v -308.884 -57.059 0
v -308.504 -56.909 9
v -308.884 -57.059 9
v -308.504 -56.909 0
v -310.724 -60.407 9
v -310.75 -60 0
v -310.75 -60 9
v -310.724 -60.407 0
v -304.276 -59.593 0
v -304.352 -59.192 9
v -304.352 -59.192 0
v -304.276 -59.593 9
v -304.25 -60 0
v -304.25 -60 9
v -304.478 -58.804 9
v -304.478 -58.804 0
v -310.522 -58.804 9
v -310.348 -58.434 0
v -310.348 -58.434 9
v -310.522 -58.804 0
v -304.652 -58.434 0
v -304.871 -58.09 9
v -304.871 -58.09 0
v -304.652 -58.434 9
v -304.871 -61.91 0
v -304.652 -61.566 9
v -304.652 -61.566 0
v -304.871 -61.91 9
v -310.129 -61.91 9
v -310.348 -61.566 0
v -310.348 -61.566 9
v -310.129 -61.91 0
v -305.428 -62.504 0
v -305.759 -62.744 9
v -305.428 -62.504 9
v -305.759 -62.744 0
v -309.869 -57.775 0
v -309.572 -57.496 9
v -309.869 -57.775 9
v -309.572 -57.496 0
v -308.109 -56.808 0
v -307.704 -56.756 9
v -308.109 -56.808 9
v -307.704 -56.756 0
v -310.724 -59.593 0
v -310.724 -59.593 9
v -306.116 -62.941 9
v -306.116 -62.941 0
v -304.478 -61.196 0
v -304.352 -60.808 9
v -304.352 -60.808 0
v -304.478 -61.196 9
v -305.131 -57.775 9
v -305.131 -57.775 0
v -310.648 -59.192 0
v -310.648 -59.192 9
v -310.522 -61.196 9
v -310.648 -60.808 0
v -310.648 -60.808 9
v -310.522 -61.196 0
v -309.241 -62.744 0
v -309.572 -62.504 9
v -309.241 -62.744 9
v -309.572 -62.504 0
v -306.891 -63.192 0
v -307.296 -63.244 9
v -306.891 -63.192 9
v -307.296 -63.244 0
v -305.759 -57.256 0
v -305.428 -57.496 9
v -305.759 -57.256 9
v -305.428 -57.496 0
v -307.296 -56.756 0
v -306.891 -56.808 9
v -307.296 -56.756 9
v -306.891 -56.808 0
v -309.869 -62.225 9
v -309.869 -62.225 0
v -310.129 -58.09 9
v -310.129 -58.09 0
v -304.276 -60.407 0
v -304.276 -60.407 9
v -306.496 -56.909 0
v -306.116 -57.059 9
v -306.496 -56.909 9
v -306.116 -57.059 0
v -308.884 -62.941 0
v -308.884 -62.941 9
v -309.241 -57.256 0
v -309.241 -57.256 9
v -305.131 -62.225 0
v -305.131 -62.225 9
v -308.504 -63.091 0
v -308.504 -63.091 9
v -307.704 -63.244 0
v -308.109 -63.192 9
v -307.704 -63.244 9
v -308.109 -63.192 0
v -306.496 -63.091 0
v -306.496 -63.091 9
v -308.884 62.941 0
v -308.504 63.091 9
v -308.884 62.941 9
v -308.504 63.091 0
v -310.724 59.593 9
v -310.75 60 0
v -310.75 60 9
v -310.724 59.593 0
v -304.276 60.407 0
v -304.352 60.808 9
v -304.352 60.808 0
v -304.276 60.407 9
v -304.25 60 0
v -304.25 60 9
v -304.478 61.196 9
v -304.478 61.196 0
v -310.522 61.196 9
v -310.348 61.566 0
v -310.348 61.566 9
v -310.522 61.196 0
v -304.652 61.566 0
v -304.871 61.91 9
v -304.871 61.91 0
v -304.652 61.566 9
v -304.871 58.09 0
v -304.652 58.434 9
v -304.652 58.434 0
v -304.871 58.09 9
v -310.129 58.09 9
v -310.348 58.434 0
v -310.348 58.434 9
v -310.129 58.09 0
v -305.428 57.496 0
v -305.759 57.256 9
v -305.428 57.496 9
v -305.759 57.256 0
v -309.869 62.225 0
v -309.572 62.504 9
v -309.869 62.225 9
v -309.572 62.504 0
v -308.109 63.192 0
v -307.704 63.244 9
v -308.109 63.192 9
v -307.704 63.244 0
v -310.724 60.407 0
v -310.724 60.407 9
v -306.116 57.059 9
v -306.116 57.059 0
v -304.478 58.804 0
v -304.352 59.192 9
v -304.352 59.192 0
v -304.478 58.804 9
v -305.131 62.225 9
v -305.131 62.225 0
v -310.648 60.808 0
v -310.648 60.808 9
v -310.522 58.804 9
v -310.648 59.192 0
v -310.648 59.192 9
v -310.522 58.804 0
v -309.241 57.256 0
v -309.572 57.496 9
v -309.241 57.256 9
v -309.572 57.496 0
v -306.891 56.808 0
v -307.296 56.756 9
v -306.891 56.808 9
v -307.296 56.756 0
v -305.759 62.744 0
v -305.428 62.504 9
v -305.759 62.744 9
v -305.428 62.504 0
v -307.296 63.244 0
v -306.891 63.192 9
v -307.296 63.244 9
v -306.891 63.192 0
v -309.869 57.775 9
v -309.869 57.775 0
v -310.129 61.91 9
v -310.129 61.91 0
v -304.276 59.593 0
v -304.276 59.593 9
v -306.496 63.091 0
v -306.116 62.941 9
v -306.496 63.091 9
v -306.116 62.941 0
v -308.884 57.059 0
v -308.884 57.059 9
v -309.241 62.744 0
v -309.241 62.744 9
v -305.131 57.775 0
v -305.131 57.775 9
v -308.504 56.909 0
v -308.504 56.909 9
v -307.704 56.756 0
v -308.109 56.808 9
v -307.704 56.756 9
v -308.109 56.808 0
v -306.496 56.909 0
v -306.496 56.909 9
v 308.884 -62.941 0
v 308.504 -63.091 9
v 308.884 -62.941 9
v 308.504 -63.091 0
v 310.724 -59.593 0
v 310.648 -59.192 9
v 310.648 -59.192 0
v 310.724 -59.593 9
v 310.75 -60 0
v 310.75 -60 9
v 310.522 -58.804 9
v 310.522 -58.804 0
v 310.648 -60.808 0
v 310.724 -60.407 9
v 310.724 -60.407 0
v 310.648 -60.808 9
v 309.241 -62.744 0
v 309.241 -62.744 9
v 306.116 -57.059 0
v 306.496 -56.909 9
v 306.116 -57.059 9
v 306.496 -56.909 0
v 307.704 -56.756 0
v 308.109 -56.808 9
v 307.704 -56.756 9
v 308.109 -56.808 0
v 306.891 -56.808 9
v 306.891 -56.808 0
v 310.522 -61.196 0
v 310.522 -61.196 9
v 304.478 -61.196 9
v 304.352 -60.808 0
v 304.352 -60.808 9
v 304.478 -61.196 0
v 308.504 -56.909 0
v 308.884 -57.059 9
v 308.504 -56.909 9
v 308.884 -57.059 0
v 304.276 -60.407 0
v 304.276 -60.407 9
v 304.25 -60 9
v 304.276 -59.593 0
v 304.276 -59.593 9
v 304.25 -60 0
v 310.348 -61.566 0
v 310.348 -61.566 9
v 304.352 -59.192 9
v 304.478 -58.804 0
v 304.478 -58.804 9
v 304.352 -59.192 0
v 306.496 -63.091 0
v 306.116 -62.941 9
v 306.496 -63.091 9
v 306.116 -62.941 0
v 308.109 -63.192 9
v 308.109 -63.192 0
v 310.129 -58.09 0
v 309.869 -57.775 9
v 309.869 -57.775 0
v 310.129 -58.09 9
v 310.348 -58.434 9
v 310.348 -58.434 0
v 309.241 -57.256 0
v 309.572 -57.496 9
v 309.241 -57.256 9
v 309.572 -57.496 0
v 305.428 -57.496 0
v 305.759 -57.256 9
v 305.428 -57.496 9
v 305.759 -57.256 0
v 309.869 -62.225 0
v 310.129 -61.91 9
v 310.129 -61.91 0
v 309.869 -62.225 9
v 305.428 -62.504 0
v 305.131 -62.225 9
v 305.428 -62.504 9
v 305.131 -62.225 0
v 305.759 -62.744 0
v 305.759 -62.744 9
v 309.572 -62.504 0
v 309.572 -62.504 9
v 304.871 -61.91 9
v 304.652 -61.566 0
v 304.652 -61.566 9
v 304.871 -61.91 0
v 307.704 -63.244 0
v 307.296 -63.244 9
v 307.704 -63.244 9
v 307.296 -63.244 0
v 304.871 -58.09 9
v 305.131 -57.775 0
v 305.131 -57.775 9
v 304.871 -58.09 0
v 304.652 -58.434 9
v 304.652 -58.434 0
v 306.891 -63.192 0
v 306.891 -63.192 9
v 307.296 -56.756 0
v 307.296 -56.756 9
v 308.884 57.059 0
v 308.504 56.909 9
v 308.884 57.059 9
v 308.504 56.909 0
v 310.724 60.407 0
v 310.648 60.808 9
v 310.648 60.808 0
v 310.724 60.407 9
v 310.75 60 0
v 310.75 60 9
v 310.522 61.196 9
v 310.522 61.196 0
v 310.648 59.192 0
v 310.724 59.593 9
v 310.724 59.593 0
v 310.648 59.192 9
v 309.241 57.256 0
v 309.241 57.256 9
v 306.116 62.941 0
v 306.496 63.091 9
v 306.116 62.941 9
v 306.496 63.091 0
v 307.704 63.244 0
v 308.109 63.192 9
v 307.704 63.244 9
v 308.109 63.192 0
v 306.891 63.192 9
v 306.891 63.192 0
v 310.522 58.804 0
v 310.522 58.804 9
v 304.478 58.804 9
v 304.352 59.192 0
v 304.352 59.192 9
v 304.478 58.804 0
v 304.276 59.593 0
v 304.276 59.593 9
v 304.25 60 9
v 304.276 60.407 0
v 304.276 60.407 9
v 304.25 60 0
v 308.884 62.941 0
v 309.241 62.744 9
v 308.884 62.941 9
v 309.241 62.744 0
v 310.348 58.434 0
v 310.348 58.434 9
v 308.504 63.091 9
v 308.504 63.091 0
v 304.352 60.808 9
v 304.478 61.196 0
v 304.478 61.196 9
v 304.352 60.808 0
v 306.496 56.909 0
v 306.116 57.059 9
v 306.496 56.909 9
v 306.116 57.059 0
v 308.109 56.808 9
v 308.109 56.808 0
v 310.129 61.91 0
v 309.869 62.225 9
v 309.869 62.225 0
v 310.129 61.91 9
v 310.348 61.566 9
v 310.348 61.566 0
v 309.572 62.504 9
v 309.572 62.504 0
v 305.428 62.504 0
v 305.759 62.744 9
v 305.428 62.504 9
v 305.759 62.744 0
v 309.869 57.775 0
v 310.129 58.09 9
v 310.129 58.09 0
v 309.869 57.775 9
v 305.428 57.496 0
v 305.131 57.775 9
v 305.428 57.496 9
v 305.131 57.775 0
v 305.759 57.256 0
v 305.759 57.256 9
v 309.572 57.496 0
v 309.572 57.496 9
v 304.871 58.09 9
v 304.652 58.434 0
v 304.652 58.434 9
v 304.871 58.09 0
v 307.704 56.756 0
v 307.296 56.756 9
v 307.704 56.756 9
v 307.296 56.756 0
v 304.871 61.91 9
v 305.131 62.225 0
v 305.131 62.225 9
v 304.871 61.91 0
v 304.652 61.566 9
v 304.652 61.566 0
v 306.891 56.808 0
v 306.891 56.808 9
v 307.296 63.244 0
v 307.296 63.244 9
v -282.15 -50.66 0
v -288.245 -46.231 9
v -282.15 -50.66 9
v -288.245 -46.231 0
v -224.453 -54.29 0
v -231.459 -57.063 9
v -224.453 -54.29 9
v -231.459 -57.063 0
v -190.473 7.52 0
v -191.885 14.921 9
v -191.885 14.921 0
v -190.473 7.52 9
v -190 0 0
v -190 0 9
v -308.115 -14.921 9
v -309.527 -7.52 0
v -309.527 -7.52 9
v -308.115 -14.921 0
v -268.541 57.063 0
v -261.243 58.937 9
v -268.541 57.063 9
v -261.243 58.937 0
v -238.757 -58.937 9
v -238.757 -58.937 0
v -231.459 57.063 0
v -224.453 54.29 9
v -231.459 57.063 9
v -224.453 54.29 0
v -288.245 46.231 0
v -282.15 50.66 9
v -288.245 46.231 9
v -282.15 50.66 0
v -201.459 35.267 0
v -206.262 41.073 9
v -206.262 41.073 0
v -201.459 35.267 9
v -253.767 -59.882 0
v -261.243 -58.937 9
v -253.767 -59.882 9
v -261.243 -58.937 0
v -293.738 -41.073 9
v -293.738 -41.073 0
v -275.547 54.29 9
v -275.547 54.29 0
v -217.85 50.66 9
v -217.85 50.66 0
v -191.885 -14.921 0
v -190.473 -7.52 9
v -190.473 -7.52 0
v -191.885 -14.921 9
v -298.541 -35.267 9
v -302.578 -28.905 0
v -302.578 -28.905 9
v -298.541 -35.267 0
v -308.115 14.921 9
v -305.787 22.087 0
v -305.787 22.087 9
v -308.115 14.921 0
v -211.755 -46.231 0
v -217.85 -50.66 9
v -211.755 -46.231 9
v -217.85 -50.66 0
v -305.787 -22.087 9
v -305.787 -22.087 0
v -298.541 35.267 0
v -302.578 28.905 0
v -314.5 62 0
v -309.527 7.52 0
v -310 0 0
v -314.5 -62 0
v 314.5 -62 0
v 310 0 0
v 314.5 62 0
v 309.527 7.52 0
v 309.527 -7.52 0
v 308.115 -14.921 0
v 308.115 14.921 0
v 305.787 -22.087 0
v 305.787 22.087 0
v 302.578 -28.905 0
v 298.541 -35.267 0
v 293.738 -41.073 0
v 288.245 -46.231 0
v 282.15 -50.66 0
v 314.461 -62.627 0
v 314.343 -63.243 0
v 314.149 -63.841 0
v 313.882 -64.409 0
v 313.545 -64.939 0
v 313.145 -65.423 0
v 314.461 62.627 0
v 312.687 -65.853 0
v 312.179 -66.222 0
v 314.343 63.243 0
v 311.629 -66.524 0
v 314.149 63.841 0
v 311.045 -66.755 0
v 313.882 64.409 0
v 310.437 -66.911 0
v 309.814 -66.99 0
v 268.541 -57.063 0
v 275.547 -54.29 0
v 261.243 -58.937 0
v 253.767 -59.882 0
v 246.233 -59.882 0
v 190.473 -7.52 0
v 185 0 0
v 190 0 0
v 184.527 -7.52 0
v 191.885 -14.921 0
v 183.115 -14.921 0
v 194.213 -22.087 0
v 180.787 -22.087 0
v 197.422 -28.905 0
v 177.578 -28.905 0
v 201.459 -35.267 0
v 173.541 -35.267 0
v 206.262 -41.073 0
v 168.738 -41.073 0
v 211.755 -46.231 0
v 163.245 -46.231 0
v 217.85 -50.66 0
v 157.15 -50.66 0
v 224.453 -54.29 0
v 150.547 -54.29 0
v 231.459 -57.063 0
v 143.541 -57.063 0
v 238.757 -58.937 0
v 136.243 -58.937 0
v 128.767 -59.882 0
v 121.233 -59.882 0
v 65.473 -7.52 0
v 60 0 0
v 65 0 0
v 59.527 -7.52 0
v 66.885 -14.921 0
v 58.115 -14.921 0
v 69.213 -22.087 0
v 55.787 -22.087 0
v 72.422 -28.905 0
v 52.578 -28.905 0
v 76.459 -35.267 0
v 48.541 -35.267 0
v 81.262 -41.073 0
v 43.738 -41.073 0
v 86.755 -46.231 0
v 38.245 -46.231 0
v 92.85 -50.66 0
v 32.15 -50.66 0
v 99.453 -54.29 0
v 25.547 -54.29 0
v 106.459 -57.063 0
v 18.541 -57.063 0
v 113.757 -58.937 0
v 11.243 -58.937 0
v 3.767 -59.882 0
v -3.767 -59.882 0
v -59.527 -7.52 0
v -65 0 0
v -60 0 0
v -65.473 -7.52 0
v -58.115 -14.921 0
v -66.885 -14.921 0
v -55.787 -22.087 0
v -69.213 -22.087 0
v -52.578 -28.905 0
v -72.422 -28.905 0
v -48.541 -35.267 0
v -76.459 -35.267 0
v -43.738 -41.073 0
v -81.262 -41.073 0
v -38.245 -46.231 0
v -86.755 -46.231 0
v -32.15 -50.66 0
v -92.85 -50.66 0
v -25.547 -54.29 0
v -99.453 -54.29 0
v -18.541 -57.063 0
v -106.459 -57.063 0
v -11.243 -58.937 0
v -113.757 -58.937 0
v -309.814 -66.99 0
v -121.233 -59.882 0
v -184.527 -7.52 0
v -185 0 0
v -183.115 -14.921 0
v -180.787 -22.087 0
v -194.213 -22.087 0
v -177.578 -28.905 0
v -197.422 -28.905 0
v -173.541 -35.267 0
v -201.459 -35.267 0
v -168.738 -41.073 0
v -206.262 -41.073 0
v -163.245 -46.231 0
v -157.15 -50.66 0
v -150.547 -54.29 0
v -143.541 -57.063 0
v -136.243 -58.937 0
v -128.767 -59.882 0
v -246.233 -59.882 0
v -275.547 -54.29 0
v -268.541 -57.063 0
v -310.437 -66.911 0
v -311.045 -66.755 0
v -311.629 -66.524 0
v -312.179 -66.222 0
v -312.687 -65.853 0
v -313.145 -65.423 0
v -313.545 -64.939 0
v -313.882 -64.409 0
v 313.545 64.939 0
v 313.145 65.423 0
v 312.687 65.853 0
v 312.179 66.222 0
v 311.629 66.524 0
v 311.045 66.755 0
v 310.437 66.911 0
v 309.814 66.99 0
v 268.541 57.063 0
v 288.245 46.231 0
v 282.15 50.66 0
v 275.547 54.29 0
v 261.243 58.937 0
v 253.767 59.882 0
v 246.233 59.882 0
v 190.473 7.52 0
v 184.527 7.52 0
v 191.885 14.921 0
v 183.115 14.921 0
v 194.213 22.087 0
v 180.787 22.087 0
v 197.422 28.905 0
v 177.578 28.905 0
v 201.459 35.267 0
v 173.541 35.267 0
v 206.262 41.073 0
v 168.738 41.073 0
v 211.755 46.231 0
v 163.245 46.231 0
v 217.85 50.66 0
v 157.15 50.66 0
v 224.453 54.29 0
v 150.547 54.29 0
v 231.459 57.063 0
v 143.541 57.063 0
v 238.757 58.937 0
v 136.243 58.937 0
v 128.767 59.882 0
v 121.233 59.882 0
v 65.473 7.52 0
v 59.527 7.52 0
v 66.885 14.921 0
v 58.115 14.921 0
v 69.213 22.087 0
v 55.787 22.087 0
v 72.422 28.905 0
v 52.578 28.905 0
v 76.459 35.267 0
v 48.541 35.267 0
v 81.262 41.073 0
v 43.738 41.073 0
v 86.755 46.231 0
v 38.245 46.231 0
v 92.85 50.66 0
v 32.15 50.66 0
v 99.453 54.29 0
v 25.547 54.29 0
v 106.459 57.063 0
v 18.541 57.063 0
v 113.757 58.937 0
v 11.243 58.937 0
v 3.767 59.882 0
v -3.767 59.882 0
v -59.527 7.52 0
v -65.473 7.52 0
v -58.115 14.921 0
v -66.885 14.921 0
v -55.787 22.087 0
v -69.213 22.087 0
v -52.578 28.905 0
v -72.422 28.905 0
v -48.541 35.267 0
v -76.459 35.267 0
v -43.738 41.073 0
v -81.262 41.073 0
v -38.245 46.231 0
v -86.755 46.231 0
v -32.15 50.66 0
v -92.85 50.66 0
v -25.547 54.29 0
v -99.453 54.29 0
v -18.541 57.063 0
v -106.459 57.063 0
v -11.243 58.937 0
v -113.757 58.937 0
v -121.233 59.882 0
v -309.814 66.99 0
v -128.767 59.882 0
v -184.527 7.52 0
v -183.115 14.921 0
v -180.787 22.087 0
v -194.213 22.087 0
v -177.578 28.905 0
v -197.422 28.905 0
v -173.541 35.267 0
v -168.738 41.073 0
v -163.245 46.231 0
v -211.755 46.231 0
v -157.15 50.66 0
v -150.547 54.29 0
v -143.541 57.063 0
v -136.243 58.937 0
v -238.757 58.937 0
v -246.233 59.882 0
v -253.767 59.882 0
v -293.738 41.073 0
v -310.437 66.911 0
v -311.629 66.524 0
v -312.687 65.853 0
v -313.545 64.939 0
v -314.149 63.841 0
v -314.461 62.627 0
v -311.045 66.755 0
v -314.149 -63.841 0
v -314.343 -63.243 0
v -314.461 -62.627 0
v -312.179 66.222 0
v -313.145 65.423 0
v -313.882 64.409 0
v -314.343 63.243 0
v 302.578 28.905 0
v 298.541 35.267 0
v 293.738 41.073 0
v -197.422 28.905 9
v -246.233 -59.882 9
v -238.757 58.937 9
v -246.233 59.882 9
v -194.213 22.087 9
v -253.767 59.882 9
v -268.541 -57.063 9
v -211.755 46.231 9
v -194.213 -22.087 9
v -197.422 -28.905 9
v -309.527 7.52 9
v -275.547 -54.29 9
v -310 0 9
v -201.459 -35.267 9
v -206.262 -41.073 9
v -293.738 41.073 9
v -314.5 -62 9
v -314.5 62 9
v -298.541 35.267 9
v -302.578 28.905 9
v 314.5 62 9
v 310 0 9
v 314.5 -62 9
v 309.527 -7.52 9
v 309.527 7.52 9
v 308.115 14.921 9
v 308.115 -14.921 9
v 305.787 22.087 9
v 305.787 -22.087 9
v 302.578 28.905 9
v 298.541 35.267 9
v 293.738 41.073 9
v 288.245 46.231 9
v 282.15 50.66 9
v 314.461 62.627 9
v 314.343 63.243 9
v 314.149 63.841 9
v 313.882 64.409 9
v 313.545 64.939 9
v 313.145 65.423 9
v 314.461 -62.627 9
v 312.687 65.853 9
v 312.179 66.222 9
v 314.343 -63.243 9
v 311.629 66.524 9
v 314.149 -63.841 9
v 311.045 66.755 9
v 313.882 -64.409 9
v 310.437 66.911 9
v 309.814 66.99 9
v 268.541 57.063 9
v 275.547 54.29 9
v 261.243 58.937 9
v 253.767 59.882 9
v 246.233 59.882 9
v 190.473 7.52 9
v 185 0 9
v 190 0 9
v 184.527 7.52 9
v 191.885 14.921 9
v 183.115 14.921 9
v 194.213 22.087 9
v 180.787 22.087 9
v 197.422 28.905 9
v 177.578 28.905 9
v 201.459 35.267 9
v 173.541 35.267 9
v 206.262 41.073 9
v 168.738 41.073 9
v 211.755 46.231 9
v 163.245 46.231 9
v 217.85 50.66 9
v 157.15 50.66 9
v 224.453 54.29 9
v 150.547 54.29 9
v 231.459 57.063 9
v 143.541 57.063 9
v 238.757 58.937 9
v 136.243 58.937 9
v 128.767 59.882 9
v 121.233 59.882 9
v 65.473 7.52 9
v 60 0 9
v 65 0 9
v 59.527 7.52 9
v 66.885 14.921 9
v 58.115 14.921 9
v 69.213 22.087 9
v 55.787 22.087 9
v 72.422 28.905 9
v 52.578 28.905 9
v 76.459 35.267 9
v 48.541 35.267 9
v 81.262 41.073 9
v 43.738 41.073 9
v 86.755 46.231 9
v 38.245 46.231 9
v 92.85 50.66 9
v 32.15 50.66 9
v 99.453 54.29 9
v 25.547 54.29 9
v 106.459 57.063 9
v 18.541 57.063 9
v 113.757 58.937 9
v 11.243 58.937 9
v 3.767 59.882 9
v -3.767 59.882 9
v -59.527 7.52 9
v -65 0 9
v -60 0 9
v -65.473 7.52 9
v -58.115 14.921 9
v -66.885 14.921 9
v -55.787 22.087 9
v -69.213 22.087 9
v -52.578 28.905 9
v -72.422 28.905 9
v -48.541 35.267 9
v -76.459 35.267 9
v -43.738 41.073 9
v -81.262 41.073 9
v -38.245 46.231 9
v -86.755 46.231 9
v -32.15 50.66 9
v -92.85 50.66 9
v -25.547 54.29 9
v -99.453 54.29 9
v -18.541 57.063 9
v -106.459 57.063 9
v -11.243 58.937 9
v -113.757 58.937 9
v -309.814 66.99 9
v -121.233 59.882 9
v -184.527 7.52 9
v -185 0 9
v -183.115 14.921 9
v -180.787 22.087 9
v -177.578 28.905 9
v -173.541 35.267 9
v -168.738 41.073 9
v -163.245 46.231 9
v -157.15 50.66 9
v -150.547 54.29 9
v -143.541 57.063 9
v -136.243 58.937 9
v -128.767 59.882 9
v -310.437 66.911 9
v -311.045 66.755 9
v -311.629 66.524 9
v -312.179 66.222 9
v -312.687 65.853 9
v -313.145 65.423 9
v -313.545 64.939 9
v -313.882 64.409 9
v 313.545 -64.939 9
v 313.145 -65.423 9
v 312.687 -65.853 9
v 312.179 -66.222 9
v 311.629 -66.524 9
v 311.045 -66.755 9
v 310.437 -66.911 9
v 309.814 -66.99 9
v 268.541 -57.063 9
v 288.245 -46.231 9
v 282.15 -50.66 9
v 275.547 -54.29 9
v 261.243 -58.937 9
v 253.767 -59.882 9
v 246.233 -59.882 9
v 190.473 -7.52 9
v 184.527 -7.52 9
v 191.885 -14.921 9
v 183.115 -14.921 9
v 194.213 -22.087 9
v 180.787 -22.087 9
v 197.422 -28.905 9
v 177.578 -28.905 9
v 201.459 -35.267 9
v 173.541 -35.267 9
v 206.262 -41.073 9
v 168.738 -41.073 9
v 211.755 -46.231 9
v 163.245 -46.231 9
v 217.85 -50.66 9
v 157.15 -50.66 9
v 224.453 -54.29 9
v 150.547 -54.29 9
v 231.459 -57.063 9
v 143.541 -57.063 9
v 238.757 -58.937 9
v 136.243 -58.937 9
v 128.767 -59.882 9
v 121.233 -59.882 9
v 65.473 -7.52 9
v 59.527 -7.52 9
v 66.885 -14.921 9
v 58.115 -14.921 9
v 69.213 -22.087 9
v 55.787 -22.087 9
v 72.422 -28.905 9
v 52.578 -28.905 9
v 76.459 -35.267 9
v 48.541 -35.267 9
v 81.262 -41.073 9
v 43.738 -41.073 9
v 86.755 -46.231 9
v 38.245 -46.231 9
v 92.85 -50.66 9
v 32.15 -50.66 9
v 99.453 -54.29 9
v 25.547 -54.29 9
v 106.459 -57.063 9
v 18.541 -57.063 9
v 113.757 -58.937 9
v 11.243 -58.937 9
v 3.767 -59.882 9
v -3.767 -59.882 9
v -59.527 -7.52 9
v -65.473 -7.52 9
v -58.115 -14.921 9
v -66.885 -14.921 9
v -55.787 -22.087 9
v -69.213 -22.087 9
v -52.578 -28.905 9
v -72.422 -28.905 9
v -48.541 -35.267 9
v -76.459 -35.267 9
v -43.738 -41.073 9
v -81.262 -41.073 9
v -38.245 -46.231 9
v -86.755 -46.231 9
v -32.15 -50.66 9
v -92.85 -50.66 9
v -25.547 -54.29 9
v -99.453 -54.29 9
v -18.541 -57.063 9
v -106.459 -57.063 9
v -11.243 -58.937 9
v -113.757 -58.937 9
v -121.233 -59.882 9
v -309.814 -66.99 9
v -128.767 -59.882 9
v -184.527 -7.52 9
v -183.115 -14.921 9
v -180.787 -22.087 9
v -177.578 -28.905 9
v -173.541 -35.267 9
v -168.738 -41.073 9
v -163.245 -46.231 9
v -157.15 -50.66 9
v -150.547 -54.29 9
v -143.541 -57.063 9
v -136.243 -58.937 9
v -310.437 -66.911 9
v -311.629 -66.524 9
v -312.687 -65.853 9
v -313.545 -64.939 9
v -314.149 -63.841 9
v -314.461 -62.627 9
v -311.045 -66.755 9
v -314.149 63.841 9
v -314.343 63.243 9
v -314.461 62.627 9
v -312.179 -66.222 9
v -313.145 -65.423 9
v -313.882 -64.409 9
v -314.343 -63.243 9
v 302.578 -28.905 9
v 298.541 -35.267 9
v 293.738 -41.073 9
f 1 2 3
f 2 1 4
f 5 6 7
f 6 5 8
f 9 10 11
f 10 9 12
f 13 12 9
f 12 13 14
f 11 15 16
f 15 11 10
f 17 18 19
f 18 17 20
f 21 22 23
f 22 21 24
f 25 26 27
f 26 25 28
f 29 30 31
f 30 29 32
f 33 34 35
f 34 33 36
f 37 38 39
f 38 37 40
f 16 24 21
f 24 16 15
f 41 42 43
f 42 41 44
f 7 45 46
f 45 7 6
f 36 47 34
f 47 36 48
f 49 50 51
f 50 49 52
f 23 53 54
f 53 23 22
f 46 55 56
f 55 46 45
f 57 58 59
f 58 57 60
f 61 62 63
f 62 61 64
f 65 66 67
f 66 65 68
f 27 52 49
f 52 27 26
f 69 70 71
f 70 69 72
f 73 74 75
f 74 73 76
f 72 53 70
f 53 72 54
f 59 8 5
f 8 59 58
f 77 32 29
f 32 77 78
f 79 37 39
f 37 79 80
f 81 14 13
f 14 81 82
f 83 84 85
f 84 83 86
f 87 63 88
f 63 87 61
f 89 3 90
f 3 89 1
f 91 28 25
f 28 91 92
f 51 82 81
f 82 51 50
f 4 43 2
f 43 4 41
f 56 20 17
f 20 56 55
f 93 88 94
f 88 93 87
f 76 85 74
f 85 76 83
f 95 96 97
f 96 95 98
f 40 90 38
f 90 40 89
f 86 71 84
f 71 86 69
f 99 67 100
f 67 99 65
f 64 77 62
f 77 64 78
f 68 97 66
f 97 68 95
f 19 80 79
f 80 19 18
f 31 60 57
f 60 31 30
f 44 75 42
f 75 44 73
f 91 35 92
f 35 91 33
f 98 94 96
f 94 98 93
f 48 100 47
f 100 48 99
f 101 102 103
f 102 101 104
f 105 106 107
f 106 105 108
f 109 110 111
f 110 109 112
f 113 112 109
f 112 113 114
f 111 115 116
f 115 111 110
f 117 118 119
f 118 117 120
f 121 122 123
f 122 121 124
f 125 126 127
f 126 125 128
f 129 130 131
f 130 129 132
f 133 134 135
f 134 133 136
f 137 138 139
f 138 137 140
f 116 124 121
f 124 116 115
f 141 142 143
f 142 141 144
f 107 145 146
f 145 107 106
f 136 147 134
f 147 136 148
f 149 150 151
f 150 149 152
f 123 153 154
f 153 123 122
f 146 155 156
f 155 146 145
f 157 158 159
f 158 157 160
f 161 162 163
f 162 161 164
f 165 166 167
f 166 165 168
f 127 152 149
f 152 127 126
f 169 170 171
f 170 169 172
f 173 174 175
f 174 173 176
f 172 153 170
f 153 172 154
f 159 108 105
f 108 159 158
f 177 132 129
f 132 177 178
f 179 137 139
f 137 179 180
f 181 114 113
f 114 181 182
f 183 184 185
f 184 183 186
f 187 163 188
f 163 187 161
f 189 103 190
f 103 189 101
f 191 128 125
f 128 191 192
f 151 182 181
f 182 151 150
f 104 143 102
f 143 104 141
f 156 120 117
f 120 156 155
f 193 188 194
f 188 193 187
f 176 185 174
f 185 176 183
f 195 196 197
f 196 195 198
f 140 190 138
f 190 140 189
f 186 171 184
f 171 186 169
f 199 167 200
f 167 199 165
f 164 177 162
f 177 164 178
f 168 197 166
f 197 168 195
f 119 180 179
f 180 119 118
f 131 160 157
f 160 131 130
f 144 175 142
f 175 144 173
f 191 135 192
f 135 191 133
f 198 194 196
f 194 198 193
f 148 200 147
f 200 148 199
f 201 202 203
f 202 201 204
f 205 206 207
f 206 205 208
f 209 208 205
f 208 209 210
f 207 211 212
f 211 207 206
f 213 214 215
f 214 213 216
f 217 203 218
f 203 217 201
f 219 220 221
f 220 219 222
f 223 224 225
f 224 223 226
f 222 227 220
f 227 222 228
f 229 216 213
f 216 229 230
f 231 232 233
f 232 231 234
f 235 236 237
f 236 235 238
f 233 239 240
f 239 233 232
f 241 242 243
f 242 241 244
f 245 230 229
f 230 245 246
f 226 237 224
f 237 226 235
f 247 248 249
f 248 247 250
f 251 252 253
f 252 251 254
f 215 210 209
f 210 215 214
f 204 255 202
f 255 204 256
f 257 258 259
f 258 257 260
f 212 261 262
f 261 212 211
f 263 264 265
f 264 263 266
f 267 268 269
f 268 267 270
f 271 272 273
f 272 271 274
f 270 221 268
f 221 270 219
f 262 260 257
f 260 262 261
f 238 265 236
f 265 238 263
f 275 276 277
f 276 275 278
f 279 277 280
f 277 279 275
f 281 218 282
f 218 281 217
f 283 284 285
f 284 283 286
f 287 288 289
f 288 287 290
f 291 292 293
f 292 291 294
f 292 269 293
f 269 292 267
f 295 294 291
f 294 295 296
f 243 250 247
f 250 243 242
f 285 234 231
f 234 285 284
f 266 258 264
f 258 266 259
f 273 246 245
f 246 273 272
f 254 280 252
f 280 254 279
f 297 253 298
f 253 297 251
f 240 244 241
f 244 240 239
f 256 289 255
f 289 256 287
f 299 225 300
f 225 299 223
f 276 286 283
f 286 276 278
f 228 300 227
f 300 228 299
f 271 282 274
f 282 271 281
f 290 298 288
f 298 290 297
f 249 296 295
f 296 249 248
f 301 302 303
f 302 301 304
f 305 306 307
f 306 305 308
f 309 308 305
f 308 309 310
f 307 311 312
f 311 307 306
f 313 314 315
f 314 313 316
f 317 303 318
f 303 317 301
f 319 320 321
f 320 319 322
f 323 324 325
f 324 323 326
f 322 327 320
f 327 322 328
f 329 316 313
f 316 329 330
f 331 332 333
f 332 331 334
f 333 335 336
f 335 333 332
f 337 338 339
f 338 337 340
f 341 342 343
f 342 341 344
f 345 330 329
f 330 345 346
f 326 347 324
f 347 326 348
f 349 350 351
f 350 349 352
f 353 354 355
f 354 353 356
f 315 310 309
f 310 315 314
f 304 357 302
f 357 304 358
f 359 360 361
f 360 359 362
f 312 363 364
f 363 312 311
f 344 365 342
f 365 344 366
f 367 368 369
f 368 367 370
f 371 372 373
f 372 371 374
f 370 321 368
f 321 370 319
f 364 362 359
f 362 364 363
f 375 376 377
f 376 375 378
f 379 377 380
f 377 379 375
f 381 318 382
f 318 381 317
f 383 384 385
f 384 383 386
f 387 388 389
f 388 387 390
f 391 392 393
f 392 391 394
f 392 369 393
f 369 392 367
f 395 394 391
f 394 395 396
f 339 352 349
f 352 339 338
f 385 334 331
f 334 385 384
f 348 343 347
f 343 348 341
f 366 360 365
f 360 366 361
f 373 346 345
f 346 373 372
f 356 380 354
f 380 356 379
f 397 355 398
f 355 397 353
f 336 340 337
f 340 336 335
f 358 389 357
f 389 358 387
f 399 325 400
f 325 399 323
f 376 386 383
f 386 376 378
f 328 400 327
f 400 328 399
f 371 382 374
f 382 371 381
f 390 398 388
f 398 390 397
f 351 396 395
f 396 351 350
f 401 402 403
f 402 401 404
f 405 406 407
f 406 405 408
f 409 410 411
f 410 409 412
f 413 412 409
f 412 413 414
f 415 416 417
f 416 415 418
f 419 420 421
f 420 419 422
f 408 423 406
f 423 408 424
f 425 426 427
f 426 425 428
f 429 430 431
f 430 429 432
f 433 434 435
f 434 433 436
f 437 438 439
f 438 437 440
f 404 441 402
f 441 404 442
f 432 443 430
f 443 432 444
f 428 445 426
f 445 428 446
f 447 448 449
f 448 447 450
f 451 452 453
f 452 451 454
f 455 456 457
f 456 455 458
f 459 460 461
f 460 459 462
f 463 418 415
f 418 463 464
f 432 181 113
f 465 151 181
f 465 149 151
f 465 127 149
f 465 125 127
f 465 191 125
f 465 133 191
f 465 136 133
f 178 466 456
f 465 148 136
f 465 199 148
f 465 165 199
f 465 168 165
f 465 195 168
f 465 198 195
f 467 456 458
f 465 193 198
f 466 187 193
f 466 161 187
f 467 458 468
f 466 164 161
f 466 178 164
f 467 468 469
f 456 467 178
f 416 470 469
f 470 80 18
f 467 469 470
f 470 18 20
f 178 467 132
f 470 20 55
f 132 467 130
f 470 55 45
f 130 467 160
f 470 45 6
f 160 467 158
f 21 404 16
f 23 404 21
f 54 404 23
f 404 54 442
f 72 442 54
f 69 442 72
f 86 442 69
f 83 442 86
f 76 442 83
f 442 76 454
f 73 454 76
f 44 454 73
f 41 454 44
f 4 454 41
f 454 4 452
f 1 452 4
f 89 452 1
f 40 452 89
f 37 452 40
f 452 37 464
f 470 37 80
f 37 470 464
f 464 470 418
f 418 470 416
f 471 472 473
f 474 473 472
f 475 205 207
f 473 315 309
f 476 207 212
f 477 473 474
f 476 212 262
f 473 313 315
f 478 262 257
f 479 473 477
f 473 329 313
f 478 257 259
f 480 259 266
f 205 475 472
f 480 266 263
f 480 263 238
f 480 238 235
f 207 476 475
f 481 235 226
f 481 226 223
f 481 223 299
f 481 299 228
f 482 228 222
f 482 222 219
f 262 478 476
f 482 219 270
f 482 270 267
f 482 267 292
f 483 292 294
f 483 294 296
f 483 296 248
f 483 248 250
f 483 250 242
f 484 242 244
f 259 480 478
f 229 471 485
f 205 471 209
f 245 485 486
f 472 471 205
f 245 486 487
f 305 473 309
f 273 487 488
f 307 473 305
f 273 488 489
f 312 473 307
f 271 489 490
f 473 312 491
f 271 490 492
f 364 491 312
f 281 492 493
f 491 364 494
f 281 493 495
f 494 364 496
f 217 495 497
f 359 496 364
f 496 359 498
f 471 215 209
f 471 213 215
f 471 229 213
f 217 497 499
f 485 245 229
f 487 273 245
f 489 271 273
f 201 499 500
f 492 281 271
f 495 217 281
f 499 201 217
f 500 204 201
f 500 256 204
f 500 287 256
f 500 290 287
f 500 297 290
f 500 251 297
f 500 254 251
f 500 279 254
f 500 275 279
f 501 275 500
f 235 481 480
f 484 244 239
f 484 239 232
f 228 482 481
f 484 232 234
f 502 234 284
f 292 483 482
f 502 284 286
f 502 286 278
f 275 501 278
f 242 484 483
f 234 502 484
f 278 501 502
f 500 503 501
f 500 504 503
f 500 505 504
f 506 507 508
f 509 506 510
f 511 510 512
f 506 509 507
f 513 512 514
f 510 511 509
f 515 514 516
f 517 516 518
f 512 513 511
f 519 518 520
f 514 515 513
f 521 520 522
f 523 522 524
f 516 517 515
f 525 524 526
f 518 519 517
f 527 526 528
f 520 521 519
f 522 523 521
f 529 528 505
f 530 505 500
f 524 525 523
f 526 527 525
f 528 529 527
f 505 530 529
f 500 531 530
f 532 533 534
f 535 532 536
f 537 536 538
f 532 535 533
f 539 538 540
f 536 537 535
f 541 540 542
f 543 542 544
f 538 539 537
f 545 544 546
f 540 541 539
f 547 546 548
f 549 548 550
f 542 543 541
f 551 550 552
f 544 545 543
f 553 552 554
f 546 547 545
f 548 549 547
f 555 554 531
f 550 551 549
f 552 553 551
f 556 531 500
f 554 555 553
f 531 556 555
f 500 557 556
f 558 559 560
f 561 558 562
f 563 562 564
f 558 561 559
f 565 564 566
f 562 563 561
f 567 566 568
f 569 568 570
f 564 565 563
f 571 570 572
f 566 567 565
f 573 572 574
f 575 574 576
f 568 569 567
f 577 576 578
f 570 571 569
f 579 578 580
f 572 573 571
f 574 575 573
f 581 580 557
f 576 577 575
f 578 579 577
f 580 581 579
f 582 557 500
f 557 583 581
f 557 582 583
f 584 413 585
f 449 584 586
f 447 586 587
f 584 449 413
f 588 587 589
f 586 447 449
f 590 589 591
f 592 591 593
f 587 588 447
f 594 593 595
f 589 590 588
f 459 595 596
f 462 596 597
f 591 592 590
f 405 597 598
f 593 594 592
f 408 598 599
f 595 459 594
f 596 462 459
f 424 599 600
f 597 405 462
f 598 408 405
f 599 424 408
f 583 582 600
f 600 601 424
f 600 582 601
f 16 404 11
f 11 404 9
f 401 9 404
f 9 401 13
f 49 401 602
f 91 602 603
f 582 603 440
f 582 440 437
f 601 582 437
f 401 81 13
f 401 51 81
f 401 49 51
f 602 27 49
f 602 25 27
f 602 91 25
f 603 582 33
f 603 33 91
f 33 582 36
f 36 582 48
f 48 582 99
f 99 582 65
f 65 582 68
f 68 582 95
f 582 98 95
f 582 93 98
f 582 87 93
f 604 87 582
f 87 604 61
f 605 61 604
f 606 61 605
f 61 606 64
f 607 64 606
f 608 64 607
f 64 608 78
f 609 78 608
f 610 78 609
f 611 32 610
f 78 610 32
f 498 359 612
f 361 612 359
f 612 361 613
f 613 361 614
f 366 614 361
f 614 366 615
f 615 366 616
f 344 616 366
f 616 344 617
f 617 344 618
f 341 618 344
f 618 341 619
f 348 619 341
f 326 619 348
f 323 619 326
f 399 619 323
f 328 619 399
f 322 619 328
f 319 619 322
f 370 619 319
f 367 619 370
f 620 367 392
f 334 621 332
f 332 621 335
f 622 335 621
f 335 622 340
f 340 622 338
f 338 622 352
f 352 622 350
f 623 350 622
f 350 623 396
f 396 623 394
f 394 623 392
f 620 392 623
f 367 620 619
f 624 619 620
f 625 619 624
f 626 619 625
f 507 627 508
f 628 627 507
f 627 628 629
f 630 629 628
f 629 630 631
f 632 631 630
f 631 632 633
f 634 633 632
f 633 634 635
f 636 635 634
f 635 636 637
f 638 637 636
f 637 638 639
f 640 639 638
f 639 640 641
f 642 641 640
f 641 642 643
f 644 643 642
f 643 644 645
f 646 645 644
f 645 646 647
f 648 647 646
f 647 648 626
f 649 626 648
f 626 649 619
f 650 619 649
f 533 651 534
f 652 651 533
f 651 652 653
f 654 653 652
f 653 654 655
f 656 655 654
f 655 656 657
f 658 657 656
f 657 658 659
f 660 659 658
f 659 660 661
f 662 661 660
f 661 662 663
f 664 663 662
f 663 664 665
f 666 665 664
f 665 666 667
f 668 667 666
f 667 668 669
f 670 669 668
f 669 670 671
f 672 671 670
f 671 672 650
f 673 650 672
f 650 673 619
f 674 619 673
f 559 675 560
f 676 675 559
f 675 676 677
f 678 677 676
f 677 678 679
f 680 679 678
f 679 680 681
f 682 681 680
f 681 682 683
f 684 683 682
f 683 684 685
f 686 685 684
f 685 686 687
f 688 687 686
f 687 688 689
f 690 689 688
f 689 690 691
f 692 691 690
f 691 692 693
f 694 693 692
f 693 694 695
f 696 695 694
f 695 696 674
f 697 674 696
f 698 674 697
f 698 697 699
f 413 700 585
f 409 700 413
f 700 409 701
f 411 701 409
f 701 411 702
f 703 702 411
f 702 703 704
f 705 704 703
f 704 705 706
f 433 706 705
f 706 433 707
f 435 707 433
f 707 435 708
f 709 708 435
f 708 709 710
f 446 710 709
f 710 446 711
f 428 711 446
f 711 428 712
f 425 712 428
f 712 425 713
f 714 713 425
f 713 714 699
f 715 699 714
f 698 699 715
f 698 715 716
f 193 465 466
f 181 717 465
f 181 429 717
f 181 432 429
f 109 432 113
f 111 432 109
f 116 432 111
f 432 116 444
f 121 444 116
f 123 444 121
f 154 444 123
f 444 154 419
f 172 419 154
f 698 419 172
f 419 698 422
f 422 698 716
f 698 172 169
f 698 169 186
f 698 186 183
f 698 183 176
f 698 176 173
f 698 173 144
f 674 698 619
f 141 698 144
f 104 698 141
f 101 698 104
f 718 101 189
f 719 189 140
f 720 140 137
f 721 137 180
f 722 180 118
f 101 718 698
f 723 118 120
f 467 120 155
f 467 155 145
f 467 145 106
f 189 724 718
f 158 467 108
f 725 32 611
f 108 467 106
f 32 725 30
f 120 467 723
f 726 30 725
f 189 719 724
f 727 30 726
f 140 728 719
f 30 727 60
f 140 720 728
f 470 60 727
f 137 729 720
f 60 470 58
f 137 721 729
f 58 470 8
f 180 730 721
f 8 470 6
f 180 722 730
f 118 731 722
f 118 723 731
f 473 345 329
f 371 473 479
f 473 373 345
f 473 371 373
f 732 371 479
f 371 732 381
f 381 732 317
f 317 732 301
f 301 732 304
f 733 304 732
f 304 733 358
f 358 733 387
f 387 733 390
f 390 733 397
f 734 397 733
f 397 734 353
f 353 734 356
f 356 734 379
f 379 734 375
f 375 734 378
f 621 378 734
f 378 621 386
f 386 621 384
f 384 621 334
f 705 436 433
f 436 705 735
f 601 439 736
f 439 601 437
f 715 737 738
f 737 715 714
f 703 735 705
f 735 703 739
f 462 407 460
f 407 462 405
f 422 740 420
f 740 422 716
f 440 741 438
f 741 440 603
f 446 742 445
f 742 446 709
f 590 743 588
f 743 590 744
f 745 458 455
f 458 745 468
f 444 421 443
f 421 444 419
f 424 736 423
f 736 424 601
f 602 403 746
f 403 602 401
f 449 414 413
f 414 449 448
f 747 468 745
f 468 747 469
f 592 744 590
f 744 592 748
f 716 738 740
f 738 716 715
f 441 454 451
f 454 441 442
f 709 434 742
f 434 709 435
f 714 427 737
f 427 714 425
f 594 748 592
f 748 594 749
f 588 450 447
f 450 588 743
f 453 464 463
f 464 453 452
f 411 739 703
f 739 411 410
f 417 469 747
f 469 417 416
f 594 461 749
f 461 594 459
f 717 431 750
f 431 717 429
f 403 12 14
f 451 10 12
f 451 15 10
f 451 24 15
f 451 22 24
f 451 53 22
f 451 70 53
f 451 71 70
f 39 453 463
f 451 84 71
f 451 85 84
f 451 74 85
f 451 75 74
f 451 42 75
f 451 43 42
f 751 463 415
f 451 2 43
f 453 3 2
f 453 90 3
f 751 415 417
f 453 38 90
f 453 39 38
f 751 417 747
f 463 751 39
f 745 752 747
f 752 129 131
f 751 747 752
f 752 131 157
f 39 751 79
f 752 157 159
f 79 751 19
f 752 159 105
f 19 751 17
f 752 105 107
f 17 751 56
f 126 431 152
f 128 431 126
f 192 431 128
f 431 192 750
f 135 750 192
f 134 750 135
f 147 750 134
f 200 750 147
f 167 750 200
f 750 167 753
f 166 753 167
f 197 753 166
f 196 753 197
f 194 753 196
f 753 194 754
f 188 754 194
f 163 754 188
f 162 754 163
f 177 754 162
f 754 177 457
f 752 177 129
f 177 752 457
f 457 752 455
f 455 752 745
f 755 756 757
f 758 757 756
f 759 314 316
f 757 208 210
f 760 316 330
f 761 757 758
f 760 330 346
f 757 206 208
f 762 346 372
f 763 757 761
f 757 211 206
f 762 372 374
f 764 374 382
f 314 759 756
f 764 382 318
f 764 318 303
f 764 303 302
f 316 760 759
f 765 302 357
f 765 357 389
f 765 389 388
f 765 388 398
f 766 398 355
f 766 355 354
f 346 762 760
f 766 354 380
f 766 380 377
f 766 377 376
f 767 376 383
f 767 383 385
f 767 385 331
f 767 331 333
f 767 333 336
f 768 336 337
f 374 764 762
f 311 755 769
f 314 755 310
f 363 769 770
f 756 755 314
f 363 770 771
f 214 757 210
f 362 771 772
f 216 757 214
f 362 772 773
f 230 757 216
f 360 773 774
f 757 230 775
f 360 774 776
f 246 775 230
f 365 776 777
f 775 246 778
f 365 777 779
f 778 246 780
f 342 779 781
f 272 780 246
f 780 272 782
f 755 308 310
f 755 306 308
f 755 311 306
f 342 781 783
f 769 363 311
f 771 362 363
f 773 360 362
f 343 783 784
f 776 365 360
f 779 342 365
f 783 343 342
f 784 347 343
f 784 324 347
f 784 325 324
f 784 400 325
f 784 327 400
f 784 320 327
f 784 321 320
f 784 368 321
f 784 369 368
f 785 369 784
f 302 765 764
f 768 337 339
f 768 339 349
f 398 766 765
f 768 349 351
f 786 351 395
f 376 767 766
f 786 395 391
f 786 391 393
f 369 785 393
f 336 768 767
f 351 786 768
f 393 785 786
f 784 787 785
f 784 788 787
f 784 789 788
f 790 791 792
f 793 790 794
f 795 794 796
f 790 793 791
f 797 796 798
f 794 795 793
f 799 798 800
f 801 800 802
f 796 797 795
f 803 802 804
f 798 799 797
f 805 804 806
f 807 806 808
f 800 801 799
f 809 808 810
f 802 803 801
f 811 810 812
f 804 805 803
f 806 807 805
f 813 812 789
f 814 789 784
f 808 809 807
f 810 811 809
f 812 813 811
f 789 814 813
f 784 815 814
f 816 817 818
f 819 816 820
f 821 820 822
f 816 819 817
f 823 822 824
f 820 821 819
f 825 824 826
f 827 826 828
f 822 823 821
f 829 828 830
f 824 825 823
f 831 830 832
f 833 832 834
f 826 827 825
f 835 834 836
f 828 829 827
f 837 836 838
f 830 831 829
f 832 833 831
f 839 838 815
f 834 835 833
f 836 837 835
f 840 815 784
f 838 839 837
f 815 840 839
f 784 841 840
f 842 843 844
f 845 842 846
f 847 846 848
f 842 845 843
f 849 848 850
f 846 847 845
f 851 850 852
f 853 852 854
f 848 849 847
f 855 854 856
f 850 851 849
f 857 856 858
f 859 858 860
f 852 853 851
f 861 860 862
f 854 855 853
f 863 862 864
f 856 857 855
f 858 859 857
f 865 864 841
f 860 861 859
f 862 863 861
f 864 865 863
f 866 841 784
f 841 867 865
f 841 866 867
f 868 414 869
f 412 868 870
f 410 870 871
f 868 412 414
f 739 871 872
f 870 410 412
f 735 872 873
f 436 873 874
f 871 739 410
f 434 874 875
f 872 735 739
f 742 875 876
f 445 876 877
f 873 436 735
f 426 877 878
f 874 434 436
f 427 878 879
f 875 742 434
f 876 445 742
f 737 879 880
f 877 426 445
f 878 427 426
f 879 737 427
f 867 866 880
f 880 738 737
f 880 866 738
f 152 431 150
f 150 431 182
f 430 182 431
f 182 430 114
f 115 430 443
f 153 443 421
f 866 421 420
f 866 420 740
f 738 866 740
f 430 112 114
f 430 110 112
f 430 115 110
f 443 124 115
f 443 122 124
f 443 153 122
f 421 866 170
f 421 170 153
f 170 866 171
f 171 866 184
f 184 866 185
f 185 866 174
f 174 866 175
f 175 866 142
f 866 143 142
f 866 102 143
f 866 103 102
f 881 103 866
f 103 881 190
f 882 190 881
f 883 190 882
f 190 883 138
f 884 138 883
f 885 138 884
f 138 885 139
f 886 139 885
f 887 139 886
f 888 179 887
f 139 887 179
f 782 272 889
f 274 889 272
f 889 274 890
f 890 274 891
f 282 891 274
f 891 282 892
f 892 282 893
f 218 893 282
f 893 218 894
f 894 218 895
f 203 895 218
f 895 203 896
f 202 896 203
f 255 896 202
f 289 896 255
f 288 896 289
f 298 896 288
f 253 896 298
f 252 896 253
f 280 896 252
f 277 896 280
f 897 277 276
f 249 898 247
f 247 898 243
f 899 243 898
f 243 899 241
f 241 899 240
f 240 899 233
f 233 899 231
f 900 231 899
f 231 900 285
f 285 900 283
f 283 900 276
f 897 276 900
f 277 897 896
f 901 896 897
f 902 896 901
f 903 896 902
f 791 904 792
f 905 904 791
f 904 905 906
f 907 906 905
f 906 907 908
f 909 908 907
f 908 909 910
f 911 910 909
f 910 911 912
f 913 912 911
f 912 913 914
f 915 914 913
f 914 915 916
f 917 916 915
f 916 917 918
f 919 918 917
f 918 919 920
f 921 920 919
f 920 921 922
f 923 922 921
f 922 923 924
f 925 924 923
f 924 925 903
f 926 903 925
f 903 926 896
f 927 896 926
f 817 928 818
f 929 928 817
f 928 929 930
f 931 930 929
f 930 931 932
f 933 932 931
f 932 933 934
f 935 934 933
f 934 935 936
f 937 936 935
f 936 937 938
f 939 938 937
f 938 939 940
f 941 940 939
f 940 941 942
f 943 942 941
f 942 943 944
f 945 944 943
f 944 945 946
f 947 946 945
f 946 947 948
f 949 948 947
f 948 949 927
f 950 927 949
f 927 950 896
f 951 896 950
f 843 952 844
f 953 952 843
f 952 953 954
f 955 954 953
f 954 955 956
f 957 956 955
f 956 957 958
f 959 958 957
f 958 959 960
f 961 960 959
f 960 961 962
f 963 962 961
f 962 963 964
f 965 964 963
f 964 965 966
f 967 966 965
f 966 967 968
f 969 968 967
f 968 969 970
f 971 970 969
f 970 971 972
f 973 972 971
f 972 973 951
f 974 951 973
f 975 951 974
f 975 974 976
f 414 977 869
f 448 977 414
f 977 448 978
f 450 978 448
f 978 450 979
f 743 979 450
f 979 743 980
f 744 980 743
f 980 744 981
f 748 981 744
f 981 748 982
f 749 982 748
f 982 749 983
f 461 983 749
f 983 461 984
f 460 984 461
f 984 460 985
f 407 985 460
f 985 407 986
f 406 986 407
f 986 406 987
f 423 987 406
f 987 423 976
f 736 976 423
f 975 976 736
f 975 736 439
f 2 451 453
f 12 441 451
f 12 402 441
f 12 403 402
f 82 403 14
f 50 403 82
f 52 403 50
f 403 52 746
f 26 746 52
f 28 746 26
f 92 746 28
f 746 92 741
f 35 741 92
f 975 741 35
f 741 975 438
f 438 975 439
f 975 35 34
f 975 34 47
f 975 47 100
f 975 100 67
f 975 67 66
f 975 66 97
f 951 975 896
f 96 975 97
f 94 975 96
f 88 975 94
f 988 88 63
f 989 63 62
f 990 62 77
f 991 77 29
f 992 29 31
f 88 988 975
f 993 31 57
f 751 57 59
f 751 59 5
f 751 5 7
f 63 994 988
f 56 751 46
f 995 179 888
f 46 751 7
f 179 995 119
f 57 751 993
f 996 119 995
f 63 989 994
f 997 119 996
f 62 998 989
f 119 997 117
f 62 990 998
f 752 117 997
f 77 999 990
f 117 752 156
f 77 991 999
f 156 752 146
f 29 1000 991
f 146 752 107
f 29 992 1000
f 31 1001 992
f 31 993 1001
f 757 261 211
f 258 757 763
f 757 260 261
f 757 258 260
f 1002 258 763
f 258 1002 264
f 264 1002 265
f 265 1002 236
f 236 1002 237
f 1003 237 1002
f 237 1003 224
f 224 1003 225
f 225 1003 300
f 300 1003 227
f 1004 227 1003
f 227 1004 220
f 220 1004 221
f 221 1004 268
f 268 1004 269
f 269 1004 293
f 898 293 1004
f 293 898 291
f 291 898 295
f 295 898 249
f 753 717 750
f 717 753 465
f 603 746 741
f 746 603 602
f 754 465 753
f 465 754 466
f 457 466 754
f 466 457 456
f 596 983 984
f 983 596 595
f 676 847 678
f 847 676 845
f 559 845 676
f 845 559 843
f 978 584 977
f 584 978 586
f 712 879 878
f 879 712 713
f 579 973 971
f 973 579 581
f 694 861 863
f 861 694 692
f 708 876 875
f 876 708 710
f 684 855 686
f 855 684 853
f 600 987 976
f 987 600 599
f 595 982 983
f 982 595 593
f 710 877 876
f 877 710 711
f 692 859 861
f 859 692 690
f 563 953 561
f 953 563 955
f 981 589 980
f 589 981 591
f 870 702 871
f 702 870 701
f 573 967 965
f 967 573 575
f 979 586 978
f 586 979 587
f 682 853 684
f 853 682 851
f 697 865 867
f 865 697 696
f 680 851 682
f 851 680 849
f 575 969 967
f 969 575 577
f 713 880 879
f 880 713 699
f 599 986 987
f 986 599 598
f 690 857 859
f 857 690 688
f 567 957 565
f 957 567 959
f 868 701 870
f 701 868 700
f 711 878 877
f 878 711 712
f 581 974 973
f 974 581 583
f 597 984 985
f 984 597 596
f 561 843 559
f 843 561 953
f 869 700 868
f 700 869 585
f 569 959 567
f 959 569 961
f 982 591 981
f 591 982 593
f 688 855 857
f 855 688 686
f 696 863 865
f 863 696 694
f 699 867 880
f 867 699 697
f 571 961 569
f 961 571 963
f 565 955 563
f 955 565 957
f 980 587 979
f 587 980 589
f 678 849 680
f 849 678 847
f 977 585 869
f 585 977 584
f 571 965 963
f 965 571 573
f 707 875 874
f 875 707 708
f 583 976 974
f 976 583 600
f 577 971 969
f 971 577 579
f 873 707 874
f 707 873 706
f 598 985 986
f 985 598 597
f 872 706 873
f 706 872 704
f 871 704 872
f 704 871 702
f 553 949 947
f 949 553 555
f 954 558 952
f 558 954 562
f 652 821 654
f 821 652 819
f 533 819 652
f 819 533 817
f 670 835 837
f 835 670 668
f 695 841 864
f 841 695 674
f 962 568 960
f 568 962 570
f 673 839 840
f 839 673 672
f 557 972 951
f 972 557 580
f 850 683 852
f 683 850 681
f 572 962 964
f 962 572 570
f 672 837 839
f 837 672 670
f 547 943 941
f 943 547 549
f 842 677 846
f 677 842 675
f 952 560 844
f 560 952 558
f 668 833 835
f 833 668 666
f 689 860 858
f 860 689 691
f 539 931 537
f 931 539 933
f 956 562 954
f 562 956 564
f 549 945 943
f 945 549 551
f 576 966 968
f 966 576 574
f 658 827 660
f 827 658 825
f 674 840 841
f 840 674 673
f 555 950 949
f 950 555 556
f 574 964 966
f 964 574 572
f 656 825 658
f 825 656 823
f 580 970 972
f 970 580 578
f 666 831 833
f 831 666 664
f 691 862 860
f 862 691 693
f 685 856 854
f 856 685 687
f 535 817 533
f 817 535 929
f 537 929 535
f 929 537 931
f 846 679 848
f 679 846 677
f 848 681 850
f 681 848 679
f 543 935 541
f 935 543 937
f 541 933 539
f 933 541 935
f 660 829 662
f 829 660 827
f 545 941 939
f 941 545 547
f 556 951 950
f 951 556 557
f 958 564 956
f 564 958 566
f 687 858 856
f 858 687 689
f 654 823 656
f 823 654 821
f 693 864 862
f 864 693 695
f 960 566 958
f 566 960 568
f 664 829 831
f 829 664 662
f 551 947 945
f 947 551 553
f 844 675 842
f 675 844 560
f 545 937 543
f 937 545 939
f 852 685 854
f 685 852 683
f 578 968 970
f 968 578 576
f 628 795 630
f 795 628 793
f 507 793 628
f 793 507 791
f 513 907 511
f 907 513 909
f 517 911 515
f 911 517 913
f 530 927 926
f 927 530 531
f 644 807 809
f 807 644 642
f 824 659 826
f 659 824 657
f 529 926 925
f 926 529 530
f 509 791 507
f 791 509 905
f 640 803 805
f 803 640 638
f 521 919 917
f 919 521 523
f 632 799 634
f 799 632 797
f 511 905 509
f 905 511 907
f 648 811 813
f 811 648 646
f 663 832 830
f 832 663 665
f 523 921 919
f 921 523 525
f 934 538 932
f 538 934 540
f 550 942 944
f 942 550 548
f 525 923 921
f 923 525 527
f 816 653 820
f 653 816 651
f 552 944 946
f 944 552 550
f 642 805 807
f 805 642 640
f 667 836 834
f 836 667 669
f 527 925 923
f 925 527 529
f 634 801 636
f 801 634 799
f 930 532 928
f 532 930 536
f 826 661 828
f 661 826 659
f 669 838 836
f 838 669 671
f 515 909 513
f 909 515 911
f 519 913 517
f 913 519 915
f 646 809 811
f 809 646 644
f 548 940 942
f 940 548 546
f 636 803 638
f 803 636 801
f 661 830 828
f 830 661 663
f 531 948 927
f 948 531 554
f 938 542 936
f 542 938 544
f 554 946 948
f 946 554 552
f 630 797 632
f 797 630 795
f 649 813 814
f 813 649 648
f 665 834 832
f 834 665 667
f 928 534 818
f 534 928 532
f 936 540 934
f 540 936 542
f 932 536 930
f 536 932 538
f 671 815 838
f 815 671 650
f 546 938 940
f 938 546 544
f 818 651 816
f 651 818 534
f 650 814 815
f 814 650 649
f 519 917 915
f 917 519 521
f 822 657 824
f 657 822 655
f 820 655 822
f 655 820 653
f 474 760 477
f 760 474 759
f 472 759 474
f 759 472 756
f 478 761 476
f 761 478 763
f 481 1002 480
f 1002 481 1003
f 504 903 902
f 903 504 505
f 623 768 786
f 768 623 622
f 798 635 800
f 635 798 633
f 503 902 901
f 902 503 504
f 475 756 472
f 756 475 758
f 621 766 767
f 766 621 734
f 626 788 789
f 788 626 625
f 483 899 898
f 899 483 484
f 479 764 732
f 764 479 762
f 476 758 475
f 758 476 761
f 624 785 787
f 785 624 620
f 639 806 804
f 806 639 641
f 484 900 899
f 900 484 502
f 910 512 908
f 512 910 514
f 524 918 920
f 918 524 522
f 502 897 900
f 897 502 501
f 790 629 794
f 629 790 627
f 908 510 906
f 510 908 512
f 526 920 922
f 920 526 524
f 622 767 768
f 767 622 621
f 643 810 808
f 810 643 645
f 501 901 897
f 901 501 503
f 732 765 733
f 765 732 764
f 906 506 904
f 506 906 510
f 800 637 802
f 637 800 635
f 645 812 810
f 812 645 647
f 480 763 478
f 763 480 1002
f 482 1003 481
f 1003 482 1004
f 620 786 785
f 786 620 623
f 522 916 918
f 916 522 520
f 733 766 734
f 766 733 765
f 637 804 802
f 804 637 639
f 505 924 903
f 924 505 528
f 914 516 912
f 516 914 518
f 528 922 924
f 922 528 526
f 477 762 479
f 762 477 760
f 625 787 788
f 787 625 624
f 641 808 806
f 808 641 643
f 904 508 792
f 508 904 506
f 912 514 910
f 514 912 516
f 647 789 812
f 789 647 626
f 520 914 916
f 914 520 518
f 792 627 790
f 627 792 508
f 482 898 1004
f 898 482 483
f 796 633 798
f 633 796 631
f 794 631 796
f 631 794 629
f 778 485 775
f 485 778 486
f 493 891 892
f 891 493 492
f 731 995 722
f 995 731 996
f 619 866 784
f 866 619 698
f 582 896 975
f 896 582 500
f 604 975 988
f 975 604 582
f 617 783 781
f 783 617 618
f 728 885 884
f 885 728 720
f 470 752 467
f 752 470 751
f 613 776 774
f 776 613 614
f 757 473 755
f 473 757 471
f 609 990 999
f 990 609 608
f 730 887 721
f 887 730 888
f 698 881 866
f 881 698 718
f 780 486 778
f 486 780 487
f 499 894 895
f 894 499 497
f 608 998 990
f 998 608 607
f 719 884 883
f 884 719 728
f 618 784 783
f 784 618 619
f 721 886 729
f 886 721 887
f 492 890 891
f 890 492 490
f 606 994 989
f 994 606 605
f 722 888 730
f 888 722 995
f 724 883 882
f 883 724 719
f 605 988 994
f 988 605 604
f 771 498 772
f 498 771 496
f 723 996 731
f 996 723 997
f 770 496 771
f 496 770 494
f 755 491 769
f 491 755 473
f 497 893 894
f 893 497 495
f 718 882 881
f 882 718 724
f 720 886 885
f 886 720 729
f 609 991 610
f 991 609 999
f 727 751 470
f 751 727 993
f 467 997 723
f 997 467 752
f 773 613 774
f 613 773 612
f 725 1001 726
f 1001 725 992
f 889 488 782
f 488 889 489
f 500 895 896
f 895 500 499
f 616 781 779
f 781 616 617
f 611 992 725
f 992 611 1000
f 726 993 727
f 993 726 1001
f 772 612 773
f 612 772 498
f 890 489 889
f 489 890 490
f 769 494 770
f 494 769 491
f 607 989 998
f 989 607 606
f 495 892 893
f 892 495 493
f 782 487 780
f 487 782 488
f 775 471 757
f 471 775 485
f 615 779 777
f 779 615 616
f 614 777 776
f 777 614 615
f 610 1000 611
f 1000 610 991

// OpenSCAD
$fn = 50;

difference() {
	union() {
		hull() {
			translate(v = [-309.5, 62.0, 0]) {
				cylinder(h = 9, r = 5);
			}
			translate(v = [309.5, 62.0, 0]) {
				cylinder(h = 9, r = 5);
			}
			translate(v = [-309.5, -62.0, 0]) {
				cylinder(h = 9, r = 5);
			}
			translate(v = [309.5, -62.0, 0]) {
				cylinder(h = 9, r = 5);
			}
		}
	}
	union() {
		translate(v = [-307.5, -60.0, -100.0]) {
			cylinder(h = 200, r = 3.25);
		}
		translate(v = [-307.5, 60.0, -100.0]) {
			cylinder(h = 200, r = 3.25);
		}
		translate(v = [307.5, -60.0, -100.0]) {
			cylinder(h = 200, r = 3.25);
		}
		translate(v = [307.5, 60.0, -100.0]) {
			cylinder(h = 200, r = 3.25);
		}
		translate(v = [-307.5, -60.0, -100.0]) {
			cylinder(h = 200, r = 1.8);
		}
		translate(v = [-307.5, 60.0, -100.0]) {
			cylinder(h = 200, r = 1.8);
		}
		translate(v = [307.5, -60.0, -100.0]) {
			cylinder(h = 200, r = 1.8);
		}
		translate(v = [307.5, 60.0, -100.0]) {
			cylinder(h = 200, r = 1.8);
		}
		translate(v = [-250.0, 0, 0.0]) {
			cylinder(h = 9, r = 60.0);
		}
		translate(v = [-125.0, 0, 0.0]) {
			cylinder(h = 9, r = 60.0);
		}
		cylinder(h = 9, r = 60.0);
		translate(v = [125.0, 0, 0.0]) {
			cylinder(h = 9, r = 60.0);
		}
		translate(v = [250.0, 0, 0.0]) {
			cylinder(h = 9, r = 60.0);
		}
	}
}
